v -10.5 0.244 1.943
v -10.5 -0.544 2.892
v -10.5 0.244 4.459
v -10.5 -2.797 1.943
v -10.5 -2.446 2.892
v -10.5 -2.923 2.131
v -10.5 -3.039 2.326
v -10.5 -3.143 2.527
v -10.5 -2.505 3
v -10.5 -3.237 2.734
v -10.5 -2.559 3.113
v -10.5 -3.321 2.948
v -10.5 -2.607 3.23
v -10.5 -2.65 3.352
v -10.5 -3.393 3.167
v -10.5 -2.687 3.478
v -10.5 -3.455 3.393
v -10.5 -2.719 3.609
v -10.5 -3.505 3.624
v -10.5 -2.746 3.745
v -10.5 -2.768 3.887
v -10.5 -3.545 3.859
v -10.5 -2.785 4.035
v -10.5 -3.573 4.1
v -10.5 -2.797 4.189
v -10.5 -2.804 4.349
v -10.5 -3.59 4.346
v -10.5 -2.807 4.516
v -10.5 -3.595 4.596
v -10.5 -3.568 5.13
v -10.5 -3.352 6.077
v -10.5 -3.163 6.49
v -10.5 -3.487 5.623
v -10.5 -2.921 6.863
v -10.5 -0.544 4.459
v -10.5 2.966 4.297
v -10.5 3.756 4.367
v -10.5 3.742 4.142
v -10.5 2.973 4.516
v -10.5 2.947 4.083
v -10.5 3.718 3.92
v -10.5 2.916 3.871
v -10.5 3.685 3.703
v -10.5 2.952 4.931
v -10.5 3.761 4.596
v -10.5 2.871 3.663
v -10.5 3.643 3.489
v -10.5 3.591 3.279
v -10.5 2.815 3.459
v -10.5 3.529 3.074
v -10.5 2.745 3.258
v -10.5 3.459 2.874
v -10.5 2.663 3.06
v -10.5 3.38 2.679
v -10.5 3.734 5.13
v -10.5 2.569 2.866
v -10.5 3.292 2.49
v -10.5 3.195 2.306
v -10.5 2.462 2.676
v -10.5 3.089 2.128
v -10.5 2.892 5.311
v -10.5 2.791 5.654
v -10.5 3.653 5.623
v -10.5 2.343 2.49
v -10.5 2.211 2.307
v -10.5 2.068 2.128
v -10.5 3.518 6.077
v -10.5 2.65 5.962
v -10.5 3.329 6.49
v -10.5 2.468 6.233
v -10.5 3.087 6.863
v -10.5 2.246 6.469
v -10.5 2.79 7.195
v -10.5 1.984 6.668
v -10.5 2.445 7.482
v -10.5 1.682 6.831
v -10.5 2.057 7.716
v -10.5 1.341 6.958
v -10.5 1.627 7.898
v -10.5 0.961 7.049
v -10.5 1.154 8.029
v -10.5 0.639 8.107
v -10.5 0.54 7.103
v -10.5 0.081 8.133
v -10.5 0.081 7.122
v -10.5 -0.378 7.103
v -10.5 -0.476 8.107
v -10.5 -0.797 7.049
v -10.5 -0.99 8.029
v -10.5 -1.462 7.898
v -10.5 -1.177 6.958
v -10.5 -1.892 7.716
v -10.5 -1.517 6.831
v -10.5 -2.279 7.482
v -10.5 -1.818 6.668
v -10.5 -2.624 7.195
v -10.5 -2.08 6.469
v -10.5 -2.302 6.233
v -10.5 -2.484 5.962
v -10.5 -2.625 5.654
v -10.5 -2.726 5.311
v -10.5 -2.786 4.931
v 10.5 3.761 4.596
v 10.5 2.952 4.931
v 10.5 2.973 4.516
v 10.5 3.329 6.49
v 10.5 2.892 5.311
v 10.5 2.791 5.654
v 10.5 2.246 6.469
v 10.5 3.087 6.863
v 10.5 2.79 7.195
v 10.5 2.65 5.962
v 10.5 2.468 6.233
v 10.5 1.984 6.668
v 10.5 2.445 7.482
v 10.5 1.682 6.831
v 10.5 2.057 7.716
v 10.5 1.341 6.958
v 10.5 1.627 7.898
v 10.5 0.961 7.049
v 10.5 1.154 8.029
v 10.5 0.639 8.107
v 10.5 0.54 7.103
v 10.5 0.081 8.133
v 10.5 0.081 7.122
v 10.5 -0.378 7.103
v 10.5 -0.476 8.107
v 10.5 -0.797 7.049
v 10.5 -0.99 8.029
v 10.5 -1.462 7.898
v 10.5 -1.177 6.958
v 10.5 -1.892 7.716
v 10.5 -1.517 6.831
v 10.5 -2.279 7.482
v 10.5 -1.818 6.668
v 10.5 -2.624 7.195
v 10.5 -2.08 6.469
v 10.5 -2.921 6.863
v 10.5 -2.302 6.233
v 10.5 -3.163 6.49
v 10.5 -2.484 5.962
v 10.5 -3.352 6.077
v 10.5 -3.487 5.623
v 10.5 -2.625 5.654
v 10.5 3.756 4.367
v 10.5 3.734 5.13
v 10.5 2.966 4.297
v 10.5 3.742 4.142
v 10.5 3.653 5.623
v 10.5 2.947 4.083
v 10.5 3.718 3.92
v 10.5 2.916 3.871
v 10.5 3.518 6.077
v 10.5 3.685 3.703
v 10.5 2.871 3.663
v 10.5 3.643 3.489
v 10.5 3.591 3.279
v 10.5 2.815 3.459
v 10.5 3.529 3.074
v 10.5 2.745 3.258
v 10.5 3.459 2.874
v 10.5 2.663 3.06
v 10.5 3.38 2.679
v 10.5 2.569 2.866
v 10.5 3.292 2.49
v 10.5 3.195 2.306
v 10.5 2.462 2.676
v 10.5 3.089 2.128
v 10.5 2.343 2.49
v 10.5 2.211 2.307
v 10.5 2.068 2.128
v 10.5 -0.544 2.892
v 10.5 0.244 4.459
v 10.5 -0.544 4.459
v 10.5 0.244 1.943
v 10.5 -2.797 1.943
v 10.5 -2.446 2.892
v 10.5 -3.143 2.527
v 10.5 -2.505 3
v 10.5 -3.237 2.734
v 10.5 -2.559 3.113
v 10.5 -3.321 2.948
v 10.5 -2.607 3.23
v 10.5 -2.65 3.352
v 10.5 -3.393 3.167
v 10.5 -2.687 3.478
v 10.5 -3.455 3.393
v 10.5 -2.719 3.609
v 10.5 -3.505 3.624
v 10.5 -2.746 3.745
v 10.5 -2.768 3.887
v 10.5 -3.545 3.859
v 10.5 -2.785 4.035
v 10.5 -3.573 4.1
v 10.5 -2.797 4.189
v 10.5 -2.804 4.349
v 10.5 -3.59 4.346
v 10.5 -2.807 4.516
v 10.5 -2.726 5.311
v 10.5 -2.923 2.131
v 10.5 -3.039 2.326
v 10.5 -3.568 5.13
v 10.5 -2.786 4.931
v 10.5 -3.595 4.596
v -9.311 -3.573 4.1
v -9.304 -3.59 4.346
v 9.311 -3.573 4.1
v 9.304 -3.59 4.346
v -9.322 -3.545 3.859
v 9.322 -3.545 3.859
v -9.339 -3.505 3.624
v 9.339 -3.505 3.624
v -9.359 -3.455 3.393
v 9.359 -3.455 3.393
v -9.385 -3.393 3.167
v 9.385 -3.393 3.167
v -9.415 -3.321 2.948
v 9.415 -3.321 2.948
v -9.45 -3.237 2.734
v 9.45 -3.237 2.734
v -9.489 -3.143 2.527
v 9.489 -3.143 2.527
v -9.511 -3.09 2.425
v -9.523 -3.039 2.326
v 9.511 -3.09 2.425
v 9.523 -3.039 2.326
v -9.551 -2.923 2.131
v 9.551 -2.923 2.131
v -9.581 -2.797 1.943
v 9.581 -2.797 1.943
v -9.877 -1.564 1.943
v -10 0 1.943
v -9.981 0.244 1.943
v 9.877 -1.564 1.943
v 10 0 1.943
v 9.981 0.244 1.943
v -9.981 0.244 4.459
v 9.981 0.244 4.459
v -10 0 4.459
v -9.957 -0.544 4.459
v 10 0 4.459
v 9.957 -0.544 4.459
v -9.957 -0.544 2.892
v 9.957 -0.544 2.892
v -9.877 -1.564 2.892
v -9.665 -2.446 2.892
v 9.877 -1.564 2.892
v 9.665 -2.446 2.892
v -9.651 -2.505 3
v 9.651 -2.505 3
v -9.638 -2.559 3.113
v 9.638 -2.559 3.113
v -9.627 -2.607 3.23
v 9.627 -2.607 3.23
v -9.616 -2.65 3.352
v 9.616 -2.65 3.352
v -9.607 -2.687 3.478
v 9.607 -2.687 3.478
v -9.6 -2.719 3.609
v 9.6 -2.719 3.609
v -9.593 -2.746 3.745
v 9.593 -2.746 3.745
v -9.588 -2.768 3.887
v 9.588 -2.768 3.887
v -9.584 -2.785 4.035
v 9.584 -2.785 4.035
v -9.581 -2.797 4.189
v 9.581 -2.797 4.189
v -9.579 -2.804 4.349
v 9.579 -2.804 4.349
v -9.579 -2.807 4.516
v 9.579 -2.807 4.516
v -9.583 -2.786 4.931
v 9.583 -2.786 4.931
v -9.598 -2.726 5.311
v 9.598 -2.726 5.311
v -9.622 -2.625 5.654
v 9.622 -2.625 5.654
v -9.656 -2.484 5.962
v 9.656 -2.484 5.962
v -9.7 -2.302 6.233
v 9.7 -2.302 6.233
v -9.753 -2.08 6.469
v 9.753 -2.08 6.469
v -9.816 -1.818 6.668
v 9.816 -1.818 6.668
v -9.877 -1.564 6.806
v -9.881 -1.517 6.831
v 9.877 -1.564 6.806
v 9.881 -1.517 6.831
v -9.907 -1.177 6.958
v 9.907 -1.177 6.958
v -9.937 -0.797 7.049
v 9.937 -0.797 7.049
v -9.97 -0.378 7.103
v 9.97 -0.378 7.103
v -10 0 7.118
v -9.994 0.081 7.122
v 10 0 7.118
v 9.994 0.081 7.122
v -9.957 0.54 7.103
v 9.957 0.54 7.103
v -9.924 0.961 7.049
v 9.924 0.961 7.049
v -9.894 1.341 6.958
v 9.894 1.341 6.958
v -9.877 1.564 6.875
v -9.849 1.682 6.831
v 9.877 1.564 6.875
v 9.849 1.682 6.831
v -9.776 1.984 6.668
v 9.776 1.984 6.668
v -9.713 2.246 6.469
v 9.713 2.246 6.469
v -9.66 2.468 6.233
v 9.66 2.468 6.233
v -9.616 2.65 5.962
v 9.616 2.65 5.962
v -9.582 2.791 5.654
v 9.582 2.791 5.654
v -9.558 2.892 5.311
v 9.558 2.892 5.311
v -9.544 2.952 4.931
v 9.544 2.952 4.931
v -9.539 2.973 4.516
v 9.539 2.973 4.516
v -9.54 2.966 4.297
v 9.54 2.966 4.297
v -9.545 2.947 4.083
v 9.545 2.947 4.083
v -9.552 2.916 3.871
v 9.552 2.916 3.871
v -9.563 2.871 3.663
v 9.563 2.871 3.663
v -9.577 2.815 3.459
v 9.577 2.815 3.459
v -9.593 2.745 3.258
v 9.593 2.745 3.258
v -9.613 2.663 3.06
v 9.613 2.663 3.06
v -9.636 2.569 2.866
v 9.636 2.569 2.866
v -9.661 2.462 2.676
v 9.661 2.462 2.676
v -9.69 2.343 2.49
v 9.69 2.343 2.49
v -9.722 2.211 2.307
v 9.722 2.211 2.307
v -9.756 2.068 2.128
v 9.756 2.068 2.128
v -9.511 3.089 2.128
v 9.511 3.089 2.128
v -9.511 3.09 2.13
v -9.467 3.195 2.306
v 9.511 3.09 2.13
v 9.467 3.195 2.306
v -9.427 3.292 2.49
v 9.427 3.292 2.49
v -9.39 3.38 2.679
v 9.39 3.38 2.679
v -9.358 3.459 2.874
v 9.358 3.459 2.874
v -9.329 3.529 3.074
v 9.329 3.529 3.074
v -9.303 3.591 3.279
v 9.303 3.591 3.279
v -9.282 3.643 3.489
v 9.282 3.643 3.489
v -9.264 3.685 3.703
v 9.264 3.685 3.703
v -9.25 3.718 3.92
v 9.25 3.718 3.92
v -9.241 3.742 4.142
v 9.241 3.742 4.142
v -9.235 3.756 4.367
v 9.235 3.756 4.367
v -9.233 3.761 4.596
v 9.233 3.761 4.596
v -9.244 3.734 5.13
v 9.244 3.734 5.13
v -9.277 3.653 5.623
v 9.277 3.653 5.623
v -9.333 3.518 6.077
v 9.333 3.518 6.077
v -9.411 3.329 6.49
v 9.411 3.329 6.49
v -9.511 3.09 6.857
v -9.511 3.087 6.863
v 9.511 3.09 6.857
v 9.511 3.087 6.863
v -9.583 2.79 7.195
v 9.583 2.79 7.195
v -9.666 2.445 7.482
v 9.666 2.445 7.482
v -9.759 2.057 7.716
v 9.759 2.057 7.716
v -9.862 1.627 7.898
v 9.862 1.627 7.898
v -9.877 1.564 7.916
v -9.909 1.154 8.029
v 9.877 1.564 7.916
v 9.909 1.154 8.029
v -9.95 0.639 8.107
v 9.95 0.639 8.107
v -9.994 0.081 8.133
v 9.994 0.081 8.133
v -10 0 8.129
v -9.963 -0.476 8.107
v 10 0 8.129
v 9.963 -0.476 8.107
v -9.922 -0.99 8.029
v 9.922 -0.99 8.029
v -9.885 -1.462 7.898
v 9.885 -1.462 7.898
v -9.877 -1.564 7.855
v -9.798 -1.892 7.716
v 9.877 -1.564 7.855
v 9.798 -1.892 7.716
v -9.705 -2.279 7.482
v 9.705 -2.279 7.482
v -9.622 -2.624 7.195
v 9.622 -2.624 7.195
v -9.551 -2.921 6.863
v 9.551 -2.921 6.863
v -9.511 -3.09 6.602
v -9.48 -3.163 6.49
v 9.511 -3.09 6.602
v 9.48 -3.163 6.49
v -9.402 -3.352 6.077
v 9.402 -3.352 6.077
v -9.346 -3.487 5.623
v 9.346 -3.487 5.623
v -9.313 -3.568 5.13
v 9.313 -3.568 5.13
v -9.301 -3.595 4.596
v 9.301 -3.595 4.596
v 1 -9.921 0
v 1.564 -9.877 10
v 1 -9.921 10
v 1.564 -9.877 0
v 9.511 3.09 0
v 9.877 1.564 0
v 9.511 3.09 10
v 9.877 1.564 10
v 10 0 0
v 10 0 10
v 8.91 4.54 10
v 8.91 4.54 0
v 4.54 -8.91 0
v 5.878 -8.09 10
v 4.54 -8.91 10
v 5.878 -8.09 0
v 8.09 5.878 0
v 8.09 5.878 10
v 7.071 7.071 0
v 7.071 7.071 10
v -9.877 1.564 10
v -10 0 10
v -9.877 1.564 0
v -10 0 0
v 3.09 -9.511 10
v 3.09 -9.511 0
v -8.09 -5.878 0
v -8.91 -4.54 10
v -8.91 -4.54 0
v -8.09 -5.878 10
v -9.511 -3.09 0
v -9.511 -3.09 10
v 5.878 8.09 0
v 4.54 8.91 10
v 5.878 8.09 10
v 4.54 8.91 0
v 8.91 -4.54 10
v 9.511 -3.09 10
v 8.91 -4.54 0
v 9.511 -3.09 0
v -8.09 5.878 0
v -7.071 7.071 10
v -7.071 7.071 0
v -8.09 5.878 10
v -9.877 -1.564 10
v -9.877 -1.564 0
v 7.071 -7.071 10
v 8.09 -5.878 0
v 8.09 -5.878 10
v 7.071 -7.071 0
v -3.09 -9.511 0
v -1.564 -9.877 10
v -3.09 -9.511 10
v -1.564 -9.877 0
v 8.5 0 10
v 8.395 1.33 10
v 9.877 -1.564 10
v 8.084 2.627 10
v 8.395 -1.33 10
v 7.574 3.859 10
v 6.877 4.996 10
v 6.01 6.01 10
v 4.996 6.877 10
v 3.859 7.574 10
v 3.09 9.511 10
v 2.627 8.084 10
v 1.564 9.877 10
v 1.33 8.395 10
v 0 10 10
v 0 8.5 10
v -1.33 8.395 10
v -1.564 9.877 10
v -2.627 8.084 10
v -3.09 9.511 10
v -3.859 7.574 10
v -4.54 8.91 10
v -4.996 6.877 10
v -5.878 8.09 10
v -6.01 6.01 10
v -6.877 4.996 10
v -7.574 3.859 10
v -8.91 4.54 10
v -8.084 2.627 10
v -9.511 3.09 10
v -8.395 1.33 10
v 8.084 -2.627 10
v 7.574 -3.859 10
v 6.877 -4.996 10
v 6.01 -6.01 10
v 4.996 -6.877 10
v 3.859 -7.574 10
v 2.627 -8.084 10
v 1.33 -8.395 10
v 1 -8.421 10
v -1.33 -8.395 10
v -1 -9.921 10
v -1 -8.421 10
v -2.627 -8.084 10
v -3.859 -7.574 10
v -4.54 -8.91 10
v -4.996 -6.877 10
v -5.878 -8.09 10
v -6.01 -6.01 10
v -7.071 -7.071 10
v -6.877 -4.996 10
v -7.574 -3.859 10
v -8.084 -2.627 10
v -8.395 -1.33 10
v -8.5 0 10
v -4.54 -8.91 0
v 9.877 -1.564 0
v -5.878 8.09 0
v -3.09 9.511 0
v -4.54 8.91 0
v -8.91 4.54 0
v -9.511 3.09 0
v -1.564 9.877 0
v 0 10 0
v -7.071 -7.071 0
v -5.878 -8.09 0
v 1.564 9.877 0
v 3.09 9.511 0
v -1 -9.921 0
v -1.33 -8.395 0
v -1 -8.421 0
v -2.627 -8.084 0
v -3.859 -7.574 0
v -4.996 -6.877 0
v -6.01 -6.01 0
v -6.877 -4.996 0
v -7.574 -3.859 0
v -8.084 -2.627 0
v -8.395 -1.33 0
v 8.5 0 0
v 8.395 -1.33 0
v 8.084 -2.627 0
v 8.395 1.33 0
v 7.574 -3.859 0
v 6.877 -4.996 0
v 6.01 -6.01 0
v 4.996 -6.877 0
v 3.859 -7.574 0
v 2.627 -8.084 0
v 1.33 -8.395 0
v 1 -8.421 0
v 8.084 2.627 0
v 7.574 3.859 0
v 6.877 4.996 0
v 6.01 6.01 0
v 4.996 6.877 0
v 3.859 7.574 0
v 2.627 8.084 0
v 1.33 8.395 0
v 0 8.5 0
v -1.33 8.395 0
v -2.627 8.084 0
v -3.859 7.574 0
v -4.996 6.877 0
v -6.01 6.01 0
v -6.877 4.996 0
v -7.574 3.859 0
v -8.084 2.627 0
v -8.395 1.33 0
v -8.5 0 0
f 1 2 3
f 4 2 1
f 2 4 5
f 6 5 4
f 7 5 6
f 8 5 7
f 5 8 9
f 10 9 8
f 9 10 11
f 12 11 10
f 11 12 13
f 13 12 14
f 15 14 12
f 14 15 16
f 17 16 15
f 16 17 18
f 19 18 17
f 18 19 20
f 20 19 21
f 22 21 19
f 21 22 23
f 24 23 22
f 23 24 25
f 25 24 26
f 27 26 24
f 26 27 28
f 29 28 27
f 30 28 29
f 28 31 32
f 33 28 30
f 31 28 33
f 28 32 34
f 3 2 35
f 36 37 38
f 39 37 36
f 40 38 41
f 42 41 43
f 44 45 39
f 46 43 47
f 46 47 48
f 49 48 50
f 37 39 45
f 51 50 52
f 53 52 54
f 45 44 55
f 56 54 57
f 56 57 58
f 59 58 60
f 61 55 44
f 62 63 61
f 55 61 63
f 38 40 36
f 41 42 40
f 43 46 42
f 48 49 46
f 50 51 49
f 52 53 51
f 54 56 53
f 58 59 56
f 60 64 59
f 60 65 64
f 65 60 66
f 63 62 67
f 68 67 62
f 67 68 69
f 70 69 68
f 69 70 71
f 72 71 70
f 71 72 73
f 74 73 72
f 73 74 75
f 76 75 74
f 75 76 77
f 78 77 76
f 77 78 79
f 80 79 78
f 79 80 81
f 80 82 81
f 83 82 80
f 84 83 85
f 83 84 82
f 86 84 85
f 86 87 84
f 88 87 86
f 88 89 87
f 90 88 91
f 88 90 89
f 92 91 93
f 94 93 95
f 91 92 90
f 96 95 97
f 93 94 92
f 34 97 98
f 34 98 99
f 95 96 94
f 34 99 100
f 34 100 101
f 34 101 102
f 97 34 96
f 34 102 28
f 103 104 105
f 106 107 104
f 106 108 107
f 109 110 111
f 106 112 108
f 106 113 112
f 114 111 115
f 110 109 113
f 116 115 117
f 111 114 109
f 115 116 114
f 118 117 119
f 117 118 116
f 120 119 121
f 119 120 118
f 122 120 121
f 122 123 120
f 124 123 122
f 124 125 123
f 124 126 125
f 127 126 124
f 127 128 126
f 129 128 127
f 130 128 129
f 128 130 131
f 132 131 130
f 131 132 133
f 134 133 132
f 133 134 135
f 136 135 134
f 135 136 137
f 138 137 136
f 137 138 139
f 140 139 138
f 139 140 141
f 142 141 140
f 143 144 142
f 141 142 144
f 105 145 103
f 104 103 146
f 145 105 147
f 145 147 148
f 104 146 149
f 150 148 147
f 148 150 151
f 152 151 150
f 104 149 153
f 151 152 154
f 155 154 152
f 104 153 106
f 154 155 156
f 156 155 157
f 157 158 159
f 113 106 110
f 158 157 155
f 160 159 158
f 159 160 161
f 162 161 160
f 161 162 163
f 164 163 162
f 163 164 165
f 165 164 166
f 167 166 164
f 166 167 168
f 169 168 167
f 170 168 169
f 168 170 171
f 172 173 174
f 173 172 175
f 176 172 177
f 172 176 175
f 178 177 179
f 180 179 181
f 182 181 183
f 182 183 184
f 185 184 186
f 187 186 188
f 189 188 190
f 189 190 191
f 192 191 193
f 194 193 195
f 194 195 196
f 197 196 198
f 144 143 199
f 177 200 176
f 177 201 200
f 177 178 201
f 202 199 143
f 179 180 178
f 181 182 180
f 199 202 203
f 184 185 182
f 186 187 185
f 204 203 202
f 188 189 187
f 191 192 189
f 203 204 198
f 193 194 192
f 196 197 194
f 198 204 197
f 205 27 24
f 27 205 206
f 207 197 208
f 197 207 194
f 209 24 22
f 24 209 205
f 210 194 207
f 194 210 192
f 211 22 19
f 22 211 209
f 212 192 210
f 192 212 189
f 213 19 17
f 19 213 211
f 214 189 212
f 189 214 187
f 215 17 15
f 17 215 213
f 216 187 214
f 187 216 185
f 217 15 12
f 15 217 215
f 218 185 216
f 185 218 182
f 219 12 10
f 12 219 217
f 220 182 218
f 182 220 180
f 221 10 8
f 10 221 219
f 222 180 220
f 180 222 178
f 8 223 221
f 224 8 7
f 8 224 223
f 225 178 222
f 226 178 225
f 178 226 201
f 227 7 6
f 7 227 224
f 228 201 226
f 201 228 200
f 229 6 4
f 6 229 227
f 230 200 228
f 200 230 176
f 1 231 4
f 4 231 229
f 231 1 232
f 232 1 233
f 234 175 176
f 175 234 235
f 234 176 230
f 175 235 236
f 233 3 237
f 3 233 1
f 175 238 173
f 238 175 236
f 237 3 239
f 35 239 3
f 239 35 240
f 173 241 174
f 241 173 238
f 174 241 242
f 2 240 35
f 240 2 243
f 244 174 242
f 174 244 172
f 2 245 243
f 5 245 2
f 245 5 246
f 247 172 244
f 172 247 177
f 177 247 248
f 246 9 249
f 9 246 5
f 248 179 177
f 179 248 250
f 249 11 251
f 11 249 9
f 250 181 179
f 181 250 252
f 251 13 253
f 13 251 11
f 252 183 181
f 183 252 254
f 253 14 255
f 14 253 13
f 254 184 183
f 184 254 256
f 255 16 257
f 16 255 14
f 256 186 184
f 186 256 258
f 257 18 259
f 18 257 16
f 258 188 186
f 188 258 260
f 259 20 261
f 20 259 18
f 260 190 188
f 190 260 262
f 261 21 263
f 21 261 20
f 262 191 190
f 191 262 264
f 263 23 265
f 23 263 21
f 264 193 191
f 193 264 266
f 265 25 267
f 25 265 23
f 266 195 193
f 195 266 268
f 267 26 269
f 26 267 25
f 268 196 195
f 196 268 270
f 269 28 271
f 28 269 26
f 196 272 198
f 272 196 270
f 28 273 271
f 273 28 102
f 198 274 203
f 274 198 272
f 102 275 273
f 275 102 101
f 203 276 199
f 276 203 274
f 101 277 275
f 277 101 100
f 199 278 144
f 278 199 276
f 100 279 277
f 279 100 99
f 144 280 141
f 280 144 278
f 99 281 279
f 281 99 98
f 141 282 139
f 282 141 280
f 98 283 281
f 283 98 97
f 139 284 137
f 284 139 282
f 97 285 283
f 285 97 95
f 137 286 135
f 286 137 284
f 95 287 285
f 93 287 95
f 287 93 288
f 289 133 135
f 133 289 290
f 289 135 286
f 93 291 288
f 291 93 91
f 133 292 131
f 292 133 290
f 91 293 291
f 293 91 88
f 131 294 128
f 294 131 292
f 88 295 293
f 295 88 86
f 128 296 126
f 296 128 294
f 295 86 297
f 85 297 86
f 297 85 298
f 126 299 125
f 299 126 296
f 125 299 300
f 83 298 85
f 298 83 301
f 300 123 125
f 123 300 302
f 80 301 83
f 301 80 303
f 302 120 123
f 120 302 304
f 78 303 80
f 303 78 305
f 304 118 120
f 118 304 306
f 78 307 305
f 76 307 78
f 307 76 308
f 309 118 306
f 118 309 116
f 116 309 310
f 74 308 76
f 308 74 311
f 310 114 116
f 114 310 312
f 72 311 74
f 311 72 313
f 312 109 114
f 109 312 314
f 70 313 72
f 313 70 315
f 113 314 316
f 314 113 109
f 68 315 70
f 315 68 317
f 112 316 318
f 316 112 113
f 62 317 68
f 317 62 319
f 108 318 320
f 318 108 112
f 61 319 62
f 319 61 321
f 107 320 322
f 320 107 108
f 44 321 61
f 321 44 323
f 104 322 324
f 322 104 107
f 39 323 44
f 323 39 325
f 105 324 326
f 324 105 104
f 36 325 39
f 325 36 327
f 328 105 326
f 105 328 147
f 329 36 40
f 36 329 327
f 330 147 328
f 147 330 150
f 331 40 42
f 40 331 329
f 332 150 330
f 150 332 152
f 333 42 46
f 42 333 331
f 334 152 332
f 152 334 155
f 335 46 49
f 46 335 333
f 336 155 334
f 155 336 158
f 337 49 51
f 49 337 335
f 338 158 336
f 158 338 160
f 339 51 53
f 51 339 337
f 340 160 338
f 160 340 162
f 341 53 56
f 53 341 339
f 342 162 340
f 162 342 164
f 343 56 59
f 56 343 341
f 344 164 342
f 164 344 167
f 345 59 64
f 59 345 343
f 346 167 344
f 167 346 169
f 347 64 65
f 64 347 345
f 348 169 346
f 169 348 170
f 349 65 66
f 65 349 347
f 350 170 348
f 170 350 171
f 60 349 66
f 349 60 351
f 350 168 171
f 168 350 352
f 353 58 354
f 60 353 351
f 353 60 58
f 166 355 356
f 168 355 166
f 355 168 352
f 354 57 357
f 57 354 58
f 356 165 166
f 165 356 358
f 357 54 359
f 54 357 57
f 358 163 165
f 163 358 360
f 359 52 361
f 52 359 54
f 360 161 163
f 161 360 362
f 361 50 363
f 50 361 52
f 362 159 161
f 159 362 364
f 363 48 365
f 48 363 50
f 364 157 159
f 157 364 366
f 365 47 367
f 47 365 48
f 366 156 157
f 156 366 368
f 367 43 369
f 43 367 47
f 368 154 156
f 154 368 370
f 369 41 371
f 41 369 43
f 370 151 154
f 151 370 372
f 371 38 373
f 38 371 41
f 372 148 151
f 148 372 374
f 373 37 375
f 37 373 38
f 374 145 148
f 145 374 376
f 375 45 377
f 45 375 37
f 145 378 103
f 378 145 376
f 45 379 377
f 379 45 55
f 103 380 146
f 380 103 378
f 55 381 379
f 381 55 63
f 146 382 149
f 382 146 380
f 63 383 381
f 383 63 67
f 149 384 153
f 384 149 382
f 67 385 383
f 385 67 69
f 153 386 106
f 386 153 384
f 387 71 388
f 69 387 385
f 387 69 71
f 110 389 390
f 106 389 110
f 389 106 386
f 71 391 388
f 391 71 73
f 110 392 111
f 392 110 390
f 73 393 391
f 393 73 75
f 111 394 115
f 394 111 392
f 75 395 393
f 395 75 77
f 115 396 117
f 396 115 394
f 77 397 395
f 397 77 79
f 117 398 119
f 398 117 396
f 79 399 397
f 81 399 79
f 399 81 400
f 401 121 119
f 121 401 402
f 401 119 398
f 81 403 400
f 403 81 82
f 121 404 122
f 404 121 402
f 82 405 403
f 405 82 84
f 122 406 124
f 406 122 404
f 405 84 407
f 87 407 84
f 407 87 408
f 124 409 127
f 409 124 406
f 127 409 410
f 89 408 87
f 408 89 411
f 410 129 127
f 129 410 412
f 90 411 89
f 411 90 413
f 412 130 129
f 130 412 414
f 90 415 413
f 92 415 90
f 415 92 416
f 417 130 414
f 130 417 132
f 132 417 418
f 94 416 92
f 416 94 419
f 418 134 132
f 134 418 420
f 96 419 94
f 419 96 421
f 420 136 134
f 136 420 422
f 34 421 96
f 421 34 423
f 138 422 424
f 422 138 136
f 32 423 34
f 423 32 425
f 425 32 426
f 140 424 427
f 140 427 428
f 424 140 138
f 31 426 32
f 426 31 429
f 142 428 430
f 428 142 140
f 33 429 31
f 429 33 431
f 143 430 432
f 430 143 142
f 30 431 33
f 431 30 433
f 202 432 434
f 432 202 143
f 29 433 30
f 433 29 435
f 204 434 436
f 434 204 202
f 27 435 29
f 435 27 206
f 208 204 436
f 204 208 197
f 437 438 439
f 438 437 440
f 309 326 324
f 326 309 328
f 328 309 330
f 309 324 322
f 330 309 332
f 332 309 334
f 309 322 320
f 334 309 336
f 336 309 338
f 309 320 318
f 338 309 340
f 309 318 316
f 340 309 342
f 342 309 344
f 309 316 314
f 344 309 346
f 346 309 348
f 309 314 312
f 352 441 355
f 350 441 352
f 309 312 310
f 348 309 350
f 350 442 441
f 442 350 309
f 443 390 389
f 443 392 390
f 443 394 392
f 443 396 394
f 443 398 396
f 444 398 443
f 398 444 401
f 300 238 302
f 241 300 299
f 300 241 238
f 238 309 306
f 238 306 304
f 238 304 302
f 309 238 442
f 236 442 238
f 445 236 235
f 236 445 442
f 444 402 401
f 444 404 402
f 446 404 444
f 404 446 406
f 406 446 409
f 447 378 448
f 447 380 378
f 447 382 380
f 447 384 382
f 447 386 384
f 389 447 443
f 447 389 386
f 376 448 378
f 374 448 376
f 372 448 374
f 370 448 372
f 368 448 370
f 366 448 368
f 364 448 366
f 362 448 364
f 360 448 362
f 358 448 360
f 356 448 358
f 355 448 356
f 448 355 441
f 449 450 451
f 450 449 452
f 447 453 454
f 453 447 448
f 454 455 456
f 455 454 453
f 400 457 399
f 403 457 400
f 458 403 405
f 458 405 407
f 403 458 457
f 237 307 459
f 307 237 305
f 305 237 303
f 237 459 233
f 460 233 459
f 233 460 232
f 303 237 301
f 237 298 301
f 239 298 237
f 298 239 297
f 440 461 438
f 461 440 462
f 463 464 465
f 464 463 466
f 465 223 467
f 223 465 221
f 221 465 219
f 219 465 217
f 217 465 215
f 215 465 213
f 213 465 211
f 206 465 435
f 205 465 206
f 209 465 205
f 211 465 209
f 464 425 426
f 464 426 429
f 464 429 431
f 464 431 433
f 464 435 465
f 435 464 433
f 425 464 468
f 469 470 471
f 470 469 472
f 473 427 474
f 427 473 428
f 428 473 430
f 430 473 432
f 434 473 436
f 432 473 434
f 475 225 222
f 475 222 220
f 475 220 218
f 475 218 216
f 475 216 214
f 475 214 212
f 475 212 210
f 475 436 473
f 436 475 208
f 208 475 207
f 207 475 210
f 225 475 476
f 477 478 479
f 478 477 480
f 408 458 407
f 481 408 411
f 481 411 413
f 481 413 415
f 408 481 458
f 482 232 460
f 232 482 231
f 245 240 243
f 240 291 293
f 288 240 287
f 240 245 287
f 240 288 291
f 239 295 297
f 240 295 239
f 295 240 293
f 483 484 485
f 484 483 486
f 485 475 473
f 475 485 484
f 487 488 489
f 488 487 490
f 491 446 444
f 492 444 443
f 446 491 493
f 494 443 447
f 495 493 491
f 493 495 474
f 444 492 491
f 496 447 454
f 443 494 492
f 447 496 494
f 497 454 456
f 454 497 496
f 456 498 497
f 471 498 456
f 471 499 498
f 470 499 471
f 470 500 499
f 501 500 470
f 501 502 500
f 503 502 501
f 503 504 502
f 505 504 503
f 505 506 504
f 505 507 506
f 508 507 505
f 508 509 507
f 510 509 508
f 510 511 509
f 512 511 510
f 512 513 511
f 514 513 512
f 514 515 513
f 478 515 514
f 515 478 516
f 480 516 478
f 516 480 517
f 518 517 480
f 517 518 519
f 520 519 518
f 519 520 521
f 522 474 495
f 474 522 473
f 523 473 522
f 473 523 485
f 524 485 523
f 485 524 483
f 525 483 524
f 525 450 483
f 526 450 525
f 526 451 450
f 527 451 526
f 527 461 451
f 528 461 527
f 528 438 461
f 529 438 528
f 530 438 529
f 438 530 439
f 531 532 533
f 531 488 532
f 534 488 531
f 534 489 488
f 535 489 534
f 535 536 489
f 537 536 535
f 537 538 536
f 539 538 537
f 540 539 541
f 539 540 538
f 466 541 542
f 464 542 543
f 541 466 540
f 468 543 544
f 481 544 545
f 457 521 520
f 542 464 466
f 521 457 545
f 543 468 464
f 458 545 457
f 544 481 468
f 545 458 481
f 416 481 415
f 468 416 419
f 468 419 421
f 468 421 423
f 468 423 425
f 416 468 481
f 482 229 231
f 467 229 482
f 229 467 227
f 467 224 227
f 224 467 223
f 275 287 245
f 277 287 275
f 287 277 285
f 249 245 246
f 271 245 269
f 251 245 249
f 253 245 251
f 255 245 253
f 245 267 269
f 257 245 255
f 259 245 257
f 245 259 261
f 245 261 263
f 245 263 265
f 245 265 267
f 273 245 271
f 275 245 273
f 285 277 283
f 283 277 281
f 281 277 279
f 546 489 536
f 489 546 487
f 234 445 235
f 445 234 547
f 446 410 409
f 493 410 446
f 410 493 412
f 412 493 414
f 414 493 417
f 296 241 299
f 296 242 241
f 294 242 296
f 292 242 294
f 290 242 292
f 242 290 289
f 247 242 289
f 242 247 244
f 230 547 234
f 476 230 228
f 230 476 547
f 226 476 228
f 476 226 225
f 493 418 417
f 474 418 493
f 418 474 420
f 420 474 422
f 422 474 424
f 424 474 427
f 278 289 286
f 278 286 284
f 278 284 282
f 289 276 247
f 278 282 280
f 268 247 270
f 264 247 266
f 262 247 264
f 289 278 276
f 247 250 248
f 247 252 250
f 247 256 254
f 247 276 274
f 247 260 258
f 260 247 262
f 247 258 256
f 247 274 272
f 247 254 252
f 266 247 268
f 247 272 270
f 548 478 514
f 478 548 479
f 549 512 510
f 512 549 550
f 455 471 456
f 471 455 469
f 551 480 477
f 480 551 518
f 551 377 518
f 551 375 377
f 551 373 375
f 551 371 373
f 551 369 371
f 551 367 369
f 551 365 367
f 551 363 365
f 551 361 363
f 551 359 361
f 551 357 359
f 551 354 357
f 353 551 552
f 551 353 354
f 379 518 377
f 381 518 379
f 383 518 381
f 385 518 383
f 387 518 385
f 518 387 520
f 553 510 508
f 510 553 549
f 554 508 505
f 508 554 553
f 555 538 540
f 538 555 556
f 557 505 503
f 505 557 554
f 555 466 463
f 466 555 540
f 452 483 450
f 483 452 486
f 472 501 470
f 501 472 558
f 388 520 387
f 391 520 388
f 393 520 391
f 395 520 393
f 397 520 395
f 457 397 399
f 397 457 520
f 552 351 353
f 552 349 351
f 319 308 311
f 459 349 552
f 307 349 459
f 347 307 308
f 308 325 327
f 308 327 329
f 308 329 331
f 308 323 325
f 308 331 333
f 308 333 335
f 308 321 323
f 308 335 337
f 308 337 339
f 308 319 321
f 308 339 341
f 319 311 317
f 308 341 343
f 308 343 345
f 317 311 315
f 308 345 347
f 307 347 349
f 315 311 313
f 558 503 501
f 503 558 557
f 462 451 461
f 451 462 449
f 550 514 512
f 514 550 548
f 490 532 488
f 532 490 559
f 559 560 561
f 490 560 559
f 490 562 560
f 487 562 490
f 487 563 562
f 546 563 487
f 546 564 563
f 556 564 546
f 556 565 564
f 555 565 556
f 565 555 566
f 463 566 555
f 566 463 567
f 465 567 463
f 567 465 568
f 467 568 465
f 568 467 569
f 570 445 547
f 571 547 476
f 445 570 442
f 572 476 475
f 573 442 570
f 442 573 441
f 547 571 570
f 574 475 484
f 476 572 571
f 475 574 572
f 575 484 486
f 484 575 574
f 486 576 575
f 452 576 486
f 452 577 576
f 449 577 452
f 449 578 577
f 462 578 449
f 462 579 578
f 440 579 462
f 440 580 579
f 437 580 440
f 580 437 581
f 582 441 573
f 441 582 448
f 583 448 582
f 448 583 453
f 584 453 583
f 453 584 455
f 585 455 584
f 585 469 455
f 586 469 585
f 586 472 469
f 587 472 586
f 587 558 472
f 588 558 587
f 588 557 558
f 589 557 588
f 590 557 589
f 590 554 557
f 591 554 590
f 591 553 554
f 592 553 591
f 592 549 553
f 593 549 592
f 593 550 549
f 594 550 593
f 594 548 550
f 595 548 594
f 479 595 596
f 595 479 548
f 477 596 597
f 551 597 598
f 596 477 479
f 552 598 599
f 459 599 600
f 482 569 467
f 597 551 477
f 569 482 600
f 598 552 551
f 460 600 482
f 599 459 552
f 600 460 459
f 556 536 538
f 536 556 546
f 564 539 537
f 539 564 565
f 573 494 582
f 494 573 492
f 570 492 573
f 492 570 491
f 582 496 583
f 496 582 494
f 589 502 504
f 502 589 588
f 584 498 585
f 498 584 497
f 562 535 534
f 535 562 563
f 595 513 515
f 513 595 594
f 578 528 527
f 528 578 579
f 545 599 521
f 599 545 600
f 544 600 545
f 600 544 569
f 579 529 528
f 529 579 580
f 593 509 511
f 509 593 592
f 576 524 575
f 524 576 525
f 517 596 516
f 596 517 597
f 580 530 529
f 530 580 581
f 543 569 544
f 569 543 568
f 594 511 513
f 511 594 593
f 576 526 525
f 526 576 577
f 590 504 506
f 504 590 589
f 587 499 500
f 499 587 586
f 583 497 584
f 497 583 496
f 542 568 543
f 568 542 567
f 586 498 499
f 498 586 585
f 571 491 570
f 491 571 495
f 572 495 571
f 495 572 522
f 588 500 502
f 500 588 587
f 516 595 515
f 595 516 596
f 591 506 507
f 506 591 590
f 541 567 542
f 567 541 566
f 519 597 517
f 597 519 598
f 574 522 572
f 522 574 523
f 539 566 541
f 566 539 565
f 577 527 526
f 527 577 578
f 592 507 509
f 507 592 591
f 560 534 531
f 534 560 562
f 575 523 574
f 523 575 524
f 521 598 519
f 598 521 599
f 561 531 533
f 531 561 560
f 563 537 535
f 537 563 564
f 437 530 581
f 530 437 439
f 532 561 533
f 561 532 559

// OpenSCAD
/*
@author: matt@misbach.org
@date: 3/6/2018

Description: Cup Clip
*/

letter="G";
textSize=7;
font="Arial Black";
opening=2;
$fn = 40;

	difference() {
		// Clip
		difference() {

			union() {
				// Monogram
				rotate([0,90,0])
					translate([-5,0,-10.5]) {
						linear_extrude(height=21)
							text(letter, size=textSize, font=font, halign="center", valign="center");
					}

				// Outer diameter
				cylinder(h=10, d=20);
			}

			// Inner diameter
			cylinder(h=10, d=17);
		}

		// Open end
		translate ([0,-10,3])
			cube([opening,10,15], true);
	}
